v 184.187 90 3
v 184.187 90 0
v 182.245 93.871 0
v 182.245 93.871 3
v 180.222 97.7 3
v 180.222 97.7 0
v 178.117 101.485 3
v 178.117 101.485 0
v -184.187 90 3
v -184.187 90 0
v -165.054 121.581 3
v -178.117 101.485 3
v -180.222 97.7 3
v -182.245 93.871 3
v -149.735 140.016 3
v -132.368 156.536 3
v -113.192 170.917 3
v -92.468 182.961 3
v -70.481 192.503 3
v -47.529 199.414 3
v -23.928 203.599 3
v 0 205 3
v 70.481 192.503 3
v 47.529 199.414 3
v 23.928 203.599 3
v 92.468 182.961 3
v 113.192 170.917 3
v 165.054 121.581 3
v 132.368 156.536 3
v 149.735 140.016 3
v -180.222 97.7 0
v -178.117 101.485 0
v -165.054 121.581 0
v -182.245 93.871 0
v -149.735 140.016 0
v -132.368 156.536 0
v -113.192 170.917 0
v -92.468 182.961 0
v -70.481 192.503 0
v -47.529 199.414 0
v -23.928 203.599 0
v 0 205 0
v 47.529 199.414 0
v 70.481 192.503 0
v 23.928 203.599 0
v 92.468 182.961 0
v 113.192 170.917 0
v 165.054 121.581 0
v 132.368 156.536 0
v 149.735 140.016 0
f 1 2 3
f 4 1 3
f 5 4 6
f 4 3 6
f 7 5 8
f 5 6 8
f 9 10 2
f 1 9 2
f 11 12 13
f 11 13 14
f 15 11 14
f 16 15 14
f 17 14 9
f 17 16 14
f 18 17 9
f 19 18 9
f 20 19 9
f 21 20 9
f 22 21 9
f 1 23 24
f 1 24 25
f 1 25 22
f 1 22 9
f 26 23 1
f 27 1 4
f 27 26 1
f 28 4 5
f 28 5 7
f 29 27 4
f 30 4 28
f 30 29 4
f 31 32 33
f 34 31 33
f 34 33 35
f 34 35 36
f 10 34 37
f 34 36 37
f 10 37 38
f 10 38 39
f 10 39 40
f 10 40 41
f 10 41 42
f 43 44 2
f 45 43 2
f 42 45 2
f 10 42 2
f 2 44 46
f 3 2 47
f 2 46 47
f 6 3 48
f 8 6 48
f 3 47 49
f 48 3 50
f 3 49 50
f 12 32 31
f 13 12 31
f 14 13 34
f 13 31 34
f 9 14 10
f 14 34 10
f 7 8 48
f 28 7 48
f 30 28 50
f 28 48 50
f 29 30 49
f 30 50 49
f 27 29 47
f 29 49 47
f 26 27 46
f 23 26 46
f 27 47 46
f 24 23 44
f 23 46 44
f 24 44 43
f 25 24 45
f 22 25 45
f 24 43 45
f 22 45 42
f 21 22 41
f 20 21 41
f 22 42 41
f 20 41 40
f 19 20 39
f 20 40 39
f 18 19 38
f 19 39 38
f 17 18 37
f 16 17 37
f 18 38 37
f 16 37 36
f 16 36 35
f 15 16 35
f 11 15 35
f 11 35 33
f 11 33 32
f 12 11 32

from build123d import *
from build123d.topology import SkipClean

# Parameters (mm, degrees)
SKETCH_1_R          = 210
SKETCH_1_R_2        = 203
EXTRUDE_2_DEPTH     = 174
EXTRUDE_START       = -174
EXTRUDE_4_DEPTH     = 174
CUT_EXTRUDE_1_DEPTH = 654
EXTRUDE_5_DEPTH     = 174
EXTRUDE_6_DEPTH     = 174
EXTRUDE_7_DEPTH     = 174
EXTRUDE_8_DEPTH     = 174
CUT_EXTRUDE_START   = -654
CUT_EXTRUDE_2_DEPTH = 654
SKETCH_10_W         = 20.487801248
SKETCH_10_H         = 174
CUT_EXTRUDE_3_DEPTH = 327
SKETCH_11_W         = 235.63772895
SKETCH_11_H         = 249.192111589
CUT_EXTRUDE_4_DEPTH = 238
EXTRUDE_10_DEPTH    = 180
SKETCH_17_W         = 286.098661696
SKETCH_17_H         = 191.878669743
CUT_EXTRUDE_5_DEPTH = 322
EXTRUDE_11_DEPTH    = 180
SKETCH_20_R         = 4
CUT_EXTRUDE_7_DEPTH = 555.5
EXTRUDE_13_DEPTH    = 3
SKETCH_25_W         = 733.806449845
SKETCH_25_H         = 306.921913774
CUT_EXTRUDE_8_DEPTH = 240.5


with BuildPart() as part:
    # 草图1 → 凸台-拉伸2 (new body)
    with BuildSketch(Plane.XY):
        Circle(SKETCH_1_R)
        Circle(SKETCH_1_R_2, mode=Mode.SUBTRACT)
    extrude(amount=EXTRUDE_2_DEPTH)

    # 草图2 → 凸台-拉伸4 (add)
    with BuildSketch(Plane.XY.offset(174).offset(EXTRUDE_START)):
        with BuildLine():
            Line((-170.735431044, -102), (-173.735431044, -102))
            Line((-173.735431044, -102), (-175.513532242, -102))
            ThreePointArc((-175.513532242, -102), (-174.63092392, -103.50381834), (-173.735431044, -105))
            Line((-173.735431044, -105), (-170.735431044, -105))
            Line((-170.735431044, -105), (-170.735431044, -102))
        make_face()
        with BuildLine():
            ThreePointArc((173.735431044, -105), (174.63092392, -103.50381834), (175.513532242, -102))
            Line((175.513532242, -102), (173.735431044, -102))
            Line((173.735431044, -102), (170.735431044, -102))
            Line((170.735431044, -102), (170.735431044, -105))
            Line((170.735431044, -105), (173.735431044, -105))
        make_face()
    extrude(amount=EXTRUDE_4_DEPTH)

    # 草图3 → 切除-拉伸1 (cut)
    with BuildSketch(Plane.XY.offset(174)):
        Polygon((-170.735431044, -102), (238.333646515, -102), (254.334169784, 272.292523591), (-334.569415043, 221.85110305), (-306.830562533, -102), align=None)
    extrude(amount=-CUT_EXTRUDE_1_DEPTH, mode=Mode.SUBTRACT)

    # 草图5 → 凸台-拉伸5 (add)
    with BuildSketch(Plane.XY.offset(174).offset(EXTRUDE_START)):
        with BuildLine():
            Line((-120, -209.75), (-10.243900624, -209.75))
            ThreePointArc((-10.243900624, -209.75), (-67.755470707, -198.769203322), (-120, -172.336879396))
            Line((-120, -172.336879396), (-120, -209.75))
        make_face()
        with BuildLine():
            ThreePointArc((120, -172.336879396), (67.755470707, -198.769203322), (10.243900624, -209.75))
            Line((10.243900624, -209.75), (120, -209.75))
            Line((120, -209.75), (120, -172.336879396))
        make_face()
    extrude(amount=EXTRUDE_5_DEPTH)

    # 草图6 → 凸台-拉伸6 (add)
    with BuildSketch(Plane.XY.offset(174).offset(EXTRUDE_START)):
        with BuildLine():
            Line((-175.513532242, -102), (-166.195667814, -102))
            ThreePointArc((-166.195667814, -102), (0, -195), (166.195667814, -102))
            Line((166.195667814, -102), (175.513532242, -102))
            ThreePointArc((175.513532242, -102), (0, -203), (-175.513532242, -102))
        make_face()
    extrude(amount=EXTRUDE_6_DEPTH)

    # 草图7 → 凸台-拉伸7 (add)
    with BuildSketch(Plane.XY.offset(174).offset(EXTRUDE_START)):
        with BuildLine():
            Line((-166.933126535, -92), (-166.933126535, -95))
            Line((-166.933126535, -95), (-170.293863659, -95))
            ThreePointArc((-170.293863659, -95), (0, -195), (170.293863659, -95))
            Line((170.293863659, -95), (166.933126535, -95))
            Line((166.933126535, -95), (166.933126535, -92))
            Line((166.933126535, -92), (171.933126535, -92))
            Line((171.933126535, -92), (188.496850106, -92))
            ThreePointArc((188.496850106, -92), (0, -209.75), (-188.496850106, -92))
            Line((-188.496850106, -92), (-171.933126535, -92))
            Line((-171.933126535, -92), (-166.933126535, -92))
        make_face()
    extrude(amount=EXTRUDE_7_DEPTH)

    # 草图8 → 凸台-拉伸8 (add)
    with BuildSketch(Plane(origin=(0, 0, 0), x_dir=(-1, 0, 0), z_dir=(0, 0, -1))):
        with BuildLine():
            Line((166.933126535, -92), (163.933126535, -92))
            Line((163.933126535, -92), (163.933126535, -99))
            Line((163.933126535, -99), (168, -99))
            ThreePointArc((168, -99), (169.158755456, -97.006780447), (170.293863659, -95))
            Line((170.293863659, -95), (166.933126535, -95))
            Line((166.933126535, -95), (166.933126535, -92))
        make_face()
        with BuildLine():
            Line((-166.933126535, -95), (-170.293863659, -95))
            ThreePointArc((-170.293863659, -95), (-169.158755456, -97.006780447), (-168, -99))
            Line((-168, -99), (-163.933126535, -99))
            Line((-163.933126535, -99), (-163.933126535, -92))
            Line((-163.933126535, -92), (-166.933126535, -92))
            Line((-166.933126535, -92), (-166.933126535, -95))
        make_face()
    extrude(amount=-EXTRUDE_8_DEPTH)

    # 草图9 → 切除-拉伸2 (cut)
    with BuildSketch(Plane.XY.offset(174).offset(CUT_EXTRUDE_START)):
        with BuildLine():
            Line((0, -195), (0, -182.225251044))
            Line((0, -182.225251044), (-50, -182.225251044))
            Line((-50, -182.225251044), (-50, -188.48076825))
            ThreePointArc((-50, -188.48076825), (-25.211606368, -193.363323576), (0, -195))
        make_face()
        with BuildLine():
            Line((0, -209.75), (0, -195))
            ThreePointArc((0, -195), (-25.211606368, -193.363323576), (-50, -188.48076825))
            Line((-50, -188.48076825), (-50, -195))
            Line((-50, -195), (-50, -209.75))
            Line((-50, -209.75), (-10.243900624, -209.75))
            Line((-10.243900624, -209.75), (0, -209.75))
        make_face()
        with BuildLine():
            ThreePointArc((50, -188.48076825), (25.211606368, -193.363323576), (0, -195))
            Line((0, -195), (0, -209.75))
            Line((0, -209.75), (10.243900624, -209.75))
            Line((10.243900624, -209.75), (50, -209.75))
            Line((50, -209.75), (50, -195))
            Line((50, -195), (50, -188.48076825))
        make_face()
        with BuildLine():
            Line((50, -182.225251044), (0, -182.225251044))
            Line((0, -182.225251044), (0, -195))
            ThreePointArc((0, -195), (25.211606368, -193.363323576), (50, -188.48076825))
            Line((50, -188.48076825), (50, -182.225251044))
        make_face()
    extrude(amount=CUT_EXTRUDE_2_DEPTH, mode=Mode.SUBTRACT)


with BuildPart() as cut_extrude_2_piece_1:
    # of the separate pieces the step leaves, piece 1, a body of its own (cut_extrude_2_pieces)
    add(part.part.solids().sort_by_distance((-183.564702489, -102, 0))[0])

    # 草图11 → 切除-拉伸4 (cut)
    with BuildSketch(Plane(origin=(0, 0, 0), x_dir=(-1, 0, 0), z_dir=(0, 0, -1))):
        with Locations((136.586471206, -141.23053543)):
            Rectangle(SKETCH_11_W, SKETCH_11_H)
    extrude(amount=-CUT_EXTRUDE_4_DEPTH, mode=Mode.SUBTRACT)


with BuildPart() as cut_extrude_2_piece_2:
    # of the separate pieces the step leaves, piece 2, a body of its own (cut_extrude_2_pieces)
    add(part.part.solids().sort_by_distance((50, -188.48076825, 0))[0])

    # 草图17 → 切除-拉伸5 (cut)
    with BuildSketch(Plane(origin=(0, -92, 0), x_dir=(1, 0, 0), z_dir=(0, 1, 0))):
        with Locations((123.864076708, -90.777636372)):
            Rectangle(SKETCH_17_W, SKETCH_17_H)
    extrude(amount=-CUT_EXTRUDE_5_DEPTH, mode=Mode.SUBTRACT)


with BuildPart() as cut_extrude_2_piece_3:
    # of the separate pieces the step leaves, piece 3, a body of its own (cut_extrude_2_pieces)
    add(part.part.solids().sort_by_distance((10.243900624, -209.75, 0))[0])

    # 草图10 → 切除-拉伸3 (cut, symmetric)
    with BuildSketch(Plane(origin=(0, -209.75, 0), x_dir=(1, 0, 0), z_dir=(0, 1, 0))):
        with Locations((0, -87)):
            Rectangle(SKETCH_10_W, SKETCH_10_H)
    extrude(amount=CUT_EXTRUDE_3_DEPTH, both=True, mode=Mode.SUBTRACT)


with BuildPart() as body_2:
    # 草图14 → 凸台-拉伸10 (new body)
    with BuildSketch(Plane.XY.offset(209.75)):
        with BuildLine():
            Line((0, 210), (0, 205))
            ThreePointArc((0, 205), (174.477792283, 107.622023768), (183.196615689, -92))
            Line((183.196615689, -92), (188.774998345, -92))
            ThreePointArc((188.774998345, -92), (178.073018731, 111.310376875), (0, 210))
        make_face()
    extrude(amount=EXTRUDE_10_DEPTH)

    # 草图18 → 凸台-拉伸11 (add)
    with SkipClean():  # the faces are left unmerged after this step: merging them gives an invalid solid
        with BuildSketch(Plane.XY.offset(389.75)):
            with BuildLine():
                ThreePointArc((0, 210), (-178.073018731, 111.310376875), (-188.774998345, -92))
                Line((-188.774998345, -92), (-183.196615689, -92))
                ThreePointArc((-183.196615689, -92), (-174.477792283, 107.622023768), (0, 205))
                Line((0, 205), (0, 210))
            make_face()
        extrude(amount=-EXTRUDE_11_DEPTH)

    # 草图20 → 切除-拉伸7 (cut, symmetric)
    with SkipClean():  # the faces are left unmerged after this step: merging them gives an invalid solid
        with BuildSketch(Plane(origin=(0, 0, 0), x_dir=(0, 0, -1), z_dir=(1, 0, 0))):
            with Locations((-382.75, 98)):
                Circle(SKETCH_20_R)
        extrude(amount=CUT_EXTRUDE_7_DEPTH, both=True, mode=Mode.SUBTRACT)

    # 草图25 → 切除-拉伸8 (cut, symmetric)
    with BuildSketch(Plane(origin=(0, 0, 0), x_dir=(1, 0, 0), z_dir=(0, 1, 0))):
        with Locations((28.762967919, -312.90839884)):
            Rectangle(SKETCH_25_W, SKETCH_25_H)
    extrude(amount=CUT_EXTRUDE_8_DEPTH, both=True, mode=Mode.SUBTRACT)


with BuildPart() as body_2_2:
    # 草图24 → 凸台-拉伸13 (new body)
    with BuildSketch(Plane.XY):
        with BuildLine():
            Line((-184.187404564, 90), (0, 90))
            Line((0, 90), (184.187404564, 90))
            ThreePointArc((184.187404564, 90), (181.243442773, 95.790471613), (178.117498021, 101.484761905))
            ThreePointArc((178.117498021, 101.484761905), (0, 205), (-178.117498021, 101.484761905))
            ThreePointArc((-178.117498021, 101.484761905), (-181.243442773, 95.790471613), (-184.187404564, 90))
        make_face()
    extrude(amount=EXTRUDE_13_DEPTH)


solid = body_2_2.part
